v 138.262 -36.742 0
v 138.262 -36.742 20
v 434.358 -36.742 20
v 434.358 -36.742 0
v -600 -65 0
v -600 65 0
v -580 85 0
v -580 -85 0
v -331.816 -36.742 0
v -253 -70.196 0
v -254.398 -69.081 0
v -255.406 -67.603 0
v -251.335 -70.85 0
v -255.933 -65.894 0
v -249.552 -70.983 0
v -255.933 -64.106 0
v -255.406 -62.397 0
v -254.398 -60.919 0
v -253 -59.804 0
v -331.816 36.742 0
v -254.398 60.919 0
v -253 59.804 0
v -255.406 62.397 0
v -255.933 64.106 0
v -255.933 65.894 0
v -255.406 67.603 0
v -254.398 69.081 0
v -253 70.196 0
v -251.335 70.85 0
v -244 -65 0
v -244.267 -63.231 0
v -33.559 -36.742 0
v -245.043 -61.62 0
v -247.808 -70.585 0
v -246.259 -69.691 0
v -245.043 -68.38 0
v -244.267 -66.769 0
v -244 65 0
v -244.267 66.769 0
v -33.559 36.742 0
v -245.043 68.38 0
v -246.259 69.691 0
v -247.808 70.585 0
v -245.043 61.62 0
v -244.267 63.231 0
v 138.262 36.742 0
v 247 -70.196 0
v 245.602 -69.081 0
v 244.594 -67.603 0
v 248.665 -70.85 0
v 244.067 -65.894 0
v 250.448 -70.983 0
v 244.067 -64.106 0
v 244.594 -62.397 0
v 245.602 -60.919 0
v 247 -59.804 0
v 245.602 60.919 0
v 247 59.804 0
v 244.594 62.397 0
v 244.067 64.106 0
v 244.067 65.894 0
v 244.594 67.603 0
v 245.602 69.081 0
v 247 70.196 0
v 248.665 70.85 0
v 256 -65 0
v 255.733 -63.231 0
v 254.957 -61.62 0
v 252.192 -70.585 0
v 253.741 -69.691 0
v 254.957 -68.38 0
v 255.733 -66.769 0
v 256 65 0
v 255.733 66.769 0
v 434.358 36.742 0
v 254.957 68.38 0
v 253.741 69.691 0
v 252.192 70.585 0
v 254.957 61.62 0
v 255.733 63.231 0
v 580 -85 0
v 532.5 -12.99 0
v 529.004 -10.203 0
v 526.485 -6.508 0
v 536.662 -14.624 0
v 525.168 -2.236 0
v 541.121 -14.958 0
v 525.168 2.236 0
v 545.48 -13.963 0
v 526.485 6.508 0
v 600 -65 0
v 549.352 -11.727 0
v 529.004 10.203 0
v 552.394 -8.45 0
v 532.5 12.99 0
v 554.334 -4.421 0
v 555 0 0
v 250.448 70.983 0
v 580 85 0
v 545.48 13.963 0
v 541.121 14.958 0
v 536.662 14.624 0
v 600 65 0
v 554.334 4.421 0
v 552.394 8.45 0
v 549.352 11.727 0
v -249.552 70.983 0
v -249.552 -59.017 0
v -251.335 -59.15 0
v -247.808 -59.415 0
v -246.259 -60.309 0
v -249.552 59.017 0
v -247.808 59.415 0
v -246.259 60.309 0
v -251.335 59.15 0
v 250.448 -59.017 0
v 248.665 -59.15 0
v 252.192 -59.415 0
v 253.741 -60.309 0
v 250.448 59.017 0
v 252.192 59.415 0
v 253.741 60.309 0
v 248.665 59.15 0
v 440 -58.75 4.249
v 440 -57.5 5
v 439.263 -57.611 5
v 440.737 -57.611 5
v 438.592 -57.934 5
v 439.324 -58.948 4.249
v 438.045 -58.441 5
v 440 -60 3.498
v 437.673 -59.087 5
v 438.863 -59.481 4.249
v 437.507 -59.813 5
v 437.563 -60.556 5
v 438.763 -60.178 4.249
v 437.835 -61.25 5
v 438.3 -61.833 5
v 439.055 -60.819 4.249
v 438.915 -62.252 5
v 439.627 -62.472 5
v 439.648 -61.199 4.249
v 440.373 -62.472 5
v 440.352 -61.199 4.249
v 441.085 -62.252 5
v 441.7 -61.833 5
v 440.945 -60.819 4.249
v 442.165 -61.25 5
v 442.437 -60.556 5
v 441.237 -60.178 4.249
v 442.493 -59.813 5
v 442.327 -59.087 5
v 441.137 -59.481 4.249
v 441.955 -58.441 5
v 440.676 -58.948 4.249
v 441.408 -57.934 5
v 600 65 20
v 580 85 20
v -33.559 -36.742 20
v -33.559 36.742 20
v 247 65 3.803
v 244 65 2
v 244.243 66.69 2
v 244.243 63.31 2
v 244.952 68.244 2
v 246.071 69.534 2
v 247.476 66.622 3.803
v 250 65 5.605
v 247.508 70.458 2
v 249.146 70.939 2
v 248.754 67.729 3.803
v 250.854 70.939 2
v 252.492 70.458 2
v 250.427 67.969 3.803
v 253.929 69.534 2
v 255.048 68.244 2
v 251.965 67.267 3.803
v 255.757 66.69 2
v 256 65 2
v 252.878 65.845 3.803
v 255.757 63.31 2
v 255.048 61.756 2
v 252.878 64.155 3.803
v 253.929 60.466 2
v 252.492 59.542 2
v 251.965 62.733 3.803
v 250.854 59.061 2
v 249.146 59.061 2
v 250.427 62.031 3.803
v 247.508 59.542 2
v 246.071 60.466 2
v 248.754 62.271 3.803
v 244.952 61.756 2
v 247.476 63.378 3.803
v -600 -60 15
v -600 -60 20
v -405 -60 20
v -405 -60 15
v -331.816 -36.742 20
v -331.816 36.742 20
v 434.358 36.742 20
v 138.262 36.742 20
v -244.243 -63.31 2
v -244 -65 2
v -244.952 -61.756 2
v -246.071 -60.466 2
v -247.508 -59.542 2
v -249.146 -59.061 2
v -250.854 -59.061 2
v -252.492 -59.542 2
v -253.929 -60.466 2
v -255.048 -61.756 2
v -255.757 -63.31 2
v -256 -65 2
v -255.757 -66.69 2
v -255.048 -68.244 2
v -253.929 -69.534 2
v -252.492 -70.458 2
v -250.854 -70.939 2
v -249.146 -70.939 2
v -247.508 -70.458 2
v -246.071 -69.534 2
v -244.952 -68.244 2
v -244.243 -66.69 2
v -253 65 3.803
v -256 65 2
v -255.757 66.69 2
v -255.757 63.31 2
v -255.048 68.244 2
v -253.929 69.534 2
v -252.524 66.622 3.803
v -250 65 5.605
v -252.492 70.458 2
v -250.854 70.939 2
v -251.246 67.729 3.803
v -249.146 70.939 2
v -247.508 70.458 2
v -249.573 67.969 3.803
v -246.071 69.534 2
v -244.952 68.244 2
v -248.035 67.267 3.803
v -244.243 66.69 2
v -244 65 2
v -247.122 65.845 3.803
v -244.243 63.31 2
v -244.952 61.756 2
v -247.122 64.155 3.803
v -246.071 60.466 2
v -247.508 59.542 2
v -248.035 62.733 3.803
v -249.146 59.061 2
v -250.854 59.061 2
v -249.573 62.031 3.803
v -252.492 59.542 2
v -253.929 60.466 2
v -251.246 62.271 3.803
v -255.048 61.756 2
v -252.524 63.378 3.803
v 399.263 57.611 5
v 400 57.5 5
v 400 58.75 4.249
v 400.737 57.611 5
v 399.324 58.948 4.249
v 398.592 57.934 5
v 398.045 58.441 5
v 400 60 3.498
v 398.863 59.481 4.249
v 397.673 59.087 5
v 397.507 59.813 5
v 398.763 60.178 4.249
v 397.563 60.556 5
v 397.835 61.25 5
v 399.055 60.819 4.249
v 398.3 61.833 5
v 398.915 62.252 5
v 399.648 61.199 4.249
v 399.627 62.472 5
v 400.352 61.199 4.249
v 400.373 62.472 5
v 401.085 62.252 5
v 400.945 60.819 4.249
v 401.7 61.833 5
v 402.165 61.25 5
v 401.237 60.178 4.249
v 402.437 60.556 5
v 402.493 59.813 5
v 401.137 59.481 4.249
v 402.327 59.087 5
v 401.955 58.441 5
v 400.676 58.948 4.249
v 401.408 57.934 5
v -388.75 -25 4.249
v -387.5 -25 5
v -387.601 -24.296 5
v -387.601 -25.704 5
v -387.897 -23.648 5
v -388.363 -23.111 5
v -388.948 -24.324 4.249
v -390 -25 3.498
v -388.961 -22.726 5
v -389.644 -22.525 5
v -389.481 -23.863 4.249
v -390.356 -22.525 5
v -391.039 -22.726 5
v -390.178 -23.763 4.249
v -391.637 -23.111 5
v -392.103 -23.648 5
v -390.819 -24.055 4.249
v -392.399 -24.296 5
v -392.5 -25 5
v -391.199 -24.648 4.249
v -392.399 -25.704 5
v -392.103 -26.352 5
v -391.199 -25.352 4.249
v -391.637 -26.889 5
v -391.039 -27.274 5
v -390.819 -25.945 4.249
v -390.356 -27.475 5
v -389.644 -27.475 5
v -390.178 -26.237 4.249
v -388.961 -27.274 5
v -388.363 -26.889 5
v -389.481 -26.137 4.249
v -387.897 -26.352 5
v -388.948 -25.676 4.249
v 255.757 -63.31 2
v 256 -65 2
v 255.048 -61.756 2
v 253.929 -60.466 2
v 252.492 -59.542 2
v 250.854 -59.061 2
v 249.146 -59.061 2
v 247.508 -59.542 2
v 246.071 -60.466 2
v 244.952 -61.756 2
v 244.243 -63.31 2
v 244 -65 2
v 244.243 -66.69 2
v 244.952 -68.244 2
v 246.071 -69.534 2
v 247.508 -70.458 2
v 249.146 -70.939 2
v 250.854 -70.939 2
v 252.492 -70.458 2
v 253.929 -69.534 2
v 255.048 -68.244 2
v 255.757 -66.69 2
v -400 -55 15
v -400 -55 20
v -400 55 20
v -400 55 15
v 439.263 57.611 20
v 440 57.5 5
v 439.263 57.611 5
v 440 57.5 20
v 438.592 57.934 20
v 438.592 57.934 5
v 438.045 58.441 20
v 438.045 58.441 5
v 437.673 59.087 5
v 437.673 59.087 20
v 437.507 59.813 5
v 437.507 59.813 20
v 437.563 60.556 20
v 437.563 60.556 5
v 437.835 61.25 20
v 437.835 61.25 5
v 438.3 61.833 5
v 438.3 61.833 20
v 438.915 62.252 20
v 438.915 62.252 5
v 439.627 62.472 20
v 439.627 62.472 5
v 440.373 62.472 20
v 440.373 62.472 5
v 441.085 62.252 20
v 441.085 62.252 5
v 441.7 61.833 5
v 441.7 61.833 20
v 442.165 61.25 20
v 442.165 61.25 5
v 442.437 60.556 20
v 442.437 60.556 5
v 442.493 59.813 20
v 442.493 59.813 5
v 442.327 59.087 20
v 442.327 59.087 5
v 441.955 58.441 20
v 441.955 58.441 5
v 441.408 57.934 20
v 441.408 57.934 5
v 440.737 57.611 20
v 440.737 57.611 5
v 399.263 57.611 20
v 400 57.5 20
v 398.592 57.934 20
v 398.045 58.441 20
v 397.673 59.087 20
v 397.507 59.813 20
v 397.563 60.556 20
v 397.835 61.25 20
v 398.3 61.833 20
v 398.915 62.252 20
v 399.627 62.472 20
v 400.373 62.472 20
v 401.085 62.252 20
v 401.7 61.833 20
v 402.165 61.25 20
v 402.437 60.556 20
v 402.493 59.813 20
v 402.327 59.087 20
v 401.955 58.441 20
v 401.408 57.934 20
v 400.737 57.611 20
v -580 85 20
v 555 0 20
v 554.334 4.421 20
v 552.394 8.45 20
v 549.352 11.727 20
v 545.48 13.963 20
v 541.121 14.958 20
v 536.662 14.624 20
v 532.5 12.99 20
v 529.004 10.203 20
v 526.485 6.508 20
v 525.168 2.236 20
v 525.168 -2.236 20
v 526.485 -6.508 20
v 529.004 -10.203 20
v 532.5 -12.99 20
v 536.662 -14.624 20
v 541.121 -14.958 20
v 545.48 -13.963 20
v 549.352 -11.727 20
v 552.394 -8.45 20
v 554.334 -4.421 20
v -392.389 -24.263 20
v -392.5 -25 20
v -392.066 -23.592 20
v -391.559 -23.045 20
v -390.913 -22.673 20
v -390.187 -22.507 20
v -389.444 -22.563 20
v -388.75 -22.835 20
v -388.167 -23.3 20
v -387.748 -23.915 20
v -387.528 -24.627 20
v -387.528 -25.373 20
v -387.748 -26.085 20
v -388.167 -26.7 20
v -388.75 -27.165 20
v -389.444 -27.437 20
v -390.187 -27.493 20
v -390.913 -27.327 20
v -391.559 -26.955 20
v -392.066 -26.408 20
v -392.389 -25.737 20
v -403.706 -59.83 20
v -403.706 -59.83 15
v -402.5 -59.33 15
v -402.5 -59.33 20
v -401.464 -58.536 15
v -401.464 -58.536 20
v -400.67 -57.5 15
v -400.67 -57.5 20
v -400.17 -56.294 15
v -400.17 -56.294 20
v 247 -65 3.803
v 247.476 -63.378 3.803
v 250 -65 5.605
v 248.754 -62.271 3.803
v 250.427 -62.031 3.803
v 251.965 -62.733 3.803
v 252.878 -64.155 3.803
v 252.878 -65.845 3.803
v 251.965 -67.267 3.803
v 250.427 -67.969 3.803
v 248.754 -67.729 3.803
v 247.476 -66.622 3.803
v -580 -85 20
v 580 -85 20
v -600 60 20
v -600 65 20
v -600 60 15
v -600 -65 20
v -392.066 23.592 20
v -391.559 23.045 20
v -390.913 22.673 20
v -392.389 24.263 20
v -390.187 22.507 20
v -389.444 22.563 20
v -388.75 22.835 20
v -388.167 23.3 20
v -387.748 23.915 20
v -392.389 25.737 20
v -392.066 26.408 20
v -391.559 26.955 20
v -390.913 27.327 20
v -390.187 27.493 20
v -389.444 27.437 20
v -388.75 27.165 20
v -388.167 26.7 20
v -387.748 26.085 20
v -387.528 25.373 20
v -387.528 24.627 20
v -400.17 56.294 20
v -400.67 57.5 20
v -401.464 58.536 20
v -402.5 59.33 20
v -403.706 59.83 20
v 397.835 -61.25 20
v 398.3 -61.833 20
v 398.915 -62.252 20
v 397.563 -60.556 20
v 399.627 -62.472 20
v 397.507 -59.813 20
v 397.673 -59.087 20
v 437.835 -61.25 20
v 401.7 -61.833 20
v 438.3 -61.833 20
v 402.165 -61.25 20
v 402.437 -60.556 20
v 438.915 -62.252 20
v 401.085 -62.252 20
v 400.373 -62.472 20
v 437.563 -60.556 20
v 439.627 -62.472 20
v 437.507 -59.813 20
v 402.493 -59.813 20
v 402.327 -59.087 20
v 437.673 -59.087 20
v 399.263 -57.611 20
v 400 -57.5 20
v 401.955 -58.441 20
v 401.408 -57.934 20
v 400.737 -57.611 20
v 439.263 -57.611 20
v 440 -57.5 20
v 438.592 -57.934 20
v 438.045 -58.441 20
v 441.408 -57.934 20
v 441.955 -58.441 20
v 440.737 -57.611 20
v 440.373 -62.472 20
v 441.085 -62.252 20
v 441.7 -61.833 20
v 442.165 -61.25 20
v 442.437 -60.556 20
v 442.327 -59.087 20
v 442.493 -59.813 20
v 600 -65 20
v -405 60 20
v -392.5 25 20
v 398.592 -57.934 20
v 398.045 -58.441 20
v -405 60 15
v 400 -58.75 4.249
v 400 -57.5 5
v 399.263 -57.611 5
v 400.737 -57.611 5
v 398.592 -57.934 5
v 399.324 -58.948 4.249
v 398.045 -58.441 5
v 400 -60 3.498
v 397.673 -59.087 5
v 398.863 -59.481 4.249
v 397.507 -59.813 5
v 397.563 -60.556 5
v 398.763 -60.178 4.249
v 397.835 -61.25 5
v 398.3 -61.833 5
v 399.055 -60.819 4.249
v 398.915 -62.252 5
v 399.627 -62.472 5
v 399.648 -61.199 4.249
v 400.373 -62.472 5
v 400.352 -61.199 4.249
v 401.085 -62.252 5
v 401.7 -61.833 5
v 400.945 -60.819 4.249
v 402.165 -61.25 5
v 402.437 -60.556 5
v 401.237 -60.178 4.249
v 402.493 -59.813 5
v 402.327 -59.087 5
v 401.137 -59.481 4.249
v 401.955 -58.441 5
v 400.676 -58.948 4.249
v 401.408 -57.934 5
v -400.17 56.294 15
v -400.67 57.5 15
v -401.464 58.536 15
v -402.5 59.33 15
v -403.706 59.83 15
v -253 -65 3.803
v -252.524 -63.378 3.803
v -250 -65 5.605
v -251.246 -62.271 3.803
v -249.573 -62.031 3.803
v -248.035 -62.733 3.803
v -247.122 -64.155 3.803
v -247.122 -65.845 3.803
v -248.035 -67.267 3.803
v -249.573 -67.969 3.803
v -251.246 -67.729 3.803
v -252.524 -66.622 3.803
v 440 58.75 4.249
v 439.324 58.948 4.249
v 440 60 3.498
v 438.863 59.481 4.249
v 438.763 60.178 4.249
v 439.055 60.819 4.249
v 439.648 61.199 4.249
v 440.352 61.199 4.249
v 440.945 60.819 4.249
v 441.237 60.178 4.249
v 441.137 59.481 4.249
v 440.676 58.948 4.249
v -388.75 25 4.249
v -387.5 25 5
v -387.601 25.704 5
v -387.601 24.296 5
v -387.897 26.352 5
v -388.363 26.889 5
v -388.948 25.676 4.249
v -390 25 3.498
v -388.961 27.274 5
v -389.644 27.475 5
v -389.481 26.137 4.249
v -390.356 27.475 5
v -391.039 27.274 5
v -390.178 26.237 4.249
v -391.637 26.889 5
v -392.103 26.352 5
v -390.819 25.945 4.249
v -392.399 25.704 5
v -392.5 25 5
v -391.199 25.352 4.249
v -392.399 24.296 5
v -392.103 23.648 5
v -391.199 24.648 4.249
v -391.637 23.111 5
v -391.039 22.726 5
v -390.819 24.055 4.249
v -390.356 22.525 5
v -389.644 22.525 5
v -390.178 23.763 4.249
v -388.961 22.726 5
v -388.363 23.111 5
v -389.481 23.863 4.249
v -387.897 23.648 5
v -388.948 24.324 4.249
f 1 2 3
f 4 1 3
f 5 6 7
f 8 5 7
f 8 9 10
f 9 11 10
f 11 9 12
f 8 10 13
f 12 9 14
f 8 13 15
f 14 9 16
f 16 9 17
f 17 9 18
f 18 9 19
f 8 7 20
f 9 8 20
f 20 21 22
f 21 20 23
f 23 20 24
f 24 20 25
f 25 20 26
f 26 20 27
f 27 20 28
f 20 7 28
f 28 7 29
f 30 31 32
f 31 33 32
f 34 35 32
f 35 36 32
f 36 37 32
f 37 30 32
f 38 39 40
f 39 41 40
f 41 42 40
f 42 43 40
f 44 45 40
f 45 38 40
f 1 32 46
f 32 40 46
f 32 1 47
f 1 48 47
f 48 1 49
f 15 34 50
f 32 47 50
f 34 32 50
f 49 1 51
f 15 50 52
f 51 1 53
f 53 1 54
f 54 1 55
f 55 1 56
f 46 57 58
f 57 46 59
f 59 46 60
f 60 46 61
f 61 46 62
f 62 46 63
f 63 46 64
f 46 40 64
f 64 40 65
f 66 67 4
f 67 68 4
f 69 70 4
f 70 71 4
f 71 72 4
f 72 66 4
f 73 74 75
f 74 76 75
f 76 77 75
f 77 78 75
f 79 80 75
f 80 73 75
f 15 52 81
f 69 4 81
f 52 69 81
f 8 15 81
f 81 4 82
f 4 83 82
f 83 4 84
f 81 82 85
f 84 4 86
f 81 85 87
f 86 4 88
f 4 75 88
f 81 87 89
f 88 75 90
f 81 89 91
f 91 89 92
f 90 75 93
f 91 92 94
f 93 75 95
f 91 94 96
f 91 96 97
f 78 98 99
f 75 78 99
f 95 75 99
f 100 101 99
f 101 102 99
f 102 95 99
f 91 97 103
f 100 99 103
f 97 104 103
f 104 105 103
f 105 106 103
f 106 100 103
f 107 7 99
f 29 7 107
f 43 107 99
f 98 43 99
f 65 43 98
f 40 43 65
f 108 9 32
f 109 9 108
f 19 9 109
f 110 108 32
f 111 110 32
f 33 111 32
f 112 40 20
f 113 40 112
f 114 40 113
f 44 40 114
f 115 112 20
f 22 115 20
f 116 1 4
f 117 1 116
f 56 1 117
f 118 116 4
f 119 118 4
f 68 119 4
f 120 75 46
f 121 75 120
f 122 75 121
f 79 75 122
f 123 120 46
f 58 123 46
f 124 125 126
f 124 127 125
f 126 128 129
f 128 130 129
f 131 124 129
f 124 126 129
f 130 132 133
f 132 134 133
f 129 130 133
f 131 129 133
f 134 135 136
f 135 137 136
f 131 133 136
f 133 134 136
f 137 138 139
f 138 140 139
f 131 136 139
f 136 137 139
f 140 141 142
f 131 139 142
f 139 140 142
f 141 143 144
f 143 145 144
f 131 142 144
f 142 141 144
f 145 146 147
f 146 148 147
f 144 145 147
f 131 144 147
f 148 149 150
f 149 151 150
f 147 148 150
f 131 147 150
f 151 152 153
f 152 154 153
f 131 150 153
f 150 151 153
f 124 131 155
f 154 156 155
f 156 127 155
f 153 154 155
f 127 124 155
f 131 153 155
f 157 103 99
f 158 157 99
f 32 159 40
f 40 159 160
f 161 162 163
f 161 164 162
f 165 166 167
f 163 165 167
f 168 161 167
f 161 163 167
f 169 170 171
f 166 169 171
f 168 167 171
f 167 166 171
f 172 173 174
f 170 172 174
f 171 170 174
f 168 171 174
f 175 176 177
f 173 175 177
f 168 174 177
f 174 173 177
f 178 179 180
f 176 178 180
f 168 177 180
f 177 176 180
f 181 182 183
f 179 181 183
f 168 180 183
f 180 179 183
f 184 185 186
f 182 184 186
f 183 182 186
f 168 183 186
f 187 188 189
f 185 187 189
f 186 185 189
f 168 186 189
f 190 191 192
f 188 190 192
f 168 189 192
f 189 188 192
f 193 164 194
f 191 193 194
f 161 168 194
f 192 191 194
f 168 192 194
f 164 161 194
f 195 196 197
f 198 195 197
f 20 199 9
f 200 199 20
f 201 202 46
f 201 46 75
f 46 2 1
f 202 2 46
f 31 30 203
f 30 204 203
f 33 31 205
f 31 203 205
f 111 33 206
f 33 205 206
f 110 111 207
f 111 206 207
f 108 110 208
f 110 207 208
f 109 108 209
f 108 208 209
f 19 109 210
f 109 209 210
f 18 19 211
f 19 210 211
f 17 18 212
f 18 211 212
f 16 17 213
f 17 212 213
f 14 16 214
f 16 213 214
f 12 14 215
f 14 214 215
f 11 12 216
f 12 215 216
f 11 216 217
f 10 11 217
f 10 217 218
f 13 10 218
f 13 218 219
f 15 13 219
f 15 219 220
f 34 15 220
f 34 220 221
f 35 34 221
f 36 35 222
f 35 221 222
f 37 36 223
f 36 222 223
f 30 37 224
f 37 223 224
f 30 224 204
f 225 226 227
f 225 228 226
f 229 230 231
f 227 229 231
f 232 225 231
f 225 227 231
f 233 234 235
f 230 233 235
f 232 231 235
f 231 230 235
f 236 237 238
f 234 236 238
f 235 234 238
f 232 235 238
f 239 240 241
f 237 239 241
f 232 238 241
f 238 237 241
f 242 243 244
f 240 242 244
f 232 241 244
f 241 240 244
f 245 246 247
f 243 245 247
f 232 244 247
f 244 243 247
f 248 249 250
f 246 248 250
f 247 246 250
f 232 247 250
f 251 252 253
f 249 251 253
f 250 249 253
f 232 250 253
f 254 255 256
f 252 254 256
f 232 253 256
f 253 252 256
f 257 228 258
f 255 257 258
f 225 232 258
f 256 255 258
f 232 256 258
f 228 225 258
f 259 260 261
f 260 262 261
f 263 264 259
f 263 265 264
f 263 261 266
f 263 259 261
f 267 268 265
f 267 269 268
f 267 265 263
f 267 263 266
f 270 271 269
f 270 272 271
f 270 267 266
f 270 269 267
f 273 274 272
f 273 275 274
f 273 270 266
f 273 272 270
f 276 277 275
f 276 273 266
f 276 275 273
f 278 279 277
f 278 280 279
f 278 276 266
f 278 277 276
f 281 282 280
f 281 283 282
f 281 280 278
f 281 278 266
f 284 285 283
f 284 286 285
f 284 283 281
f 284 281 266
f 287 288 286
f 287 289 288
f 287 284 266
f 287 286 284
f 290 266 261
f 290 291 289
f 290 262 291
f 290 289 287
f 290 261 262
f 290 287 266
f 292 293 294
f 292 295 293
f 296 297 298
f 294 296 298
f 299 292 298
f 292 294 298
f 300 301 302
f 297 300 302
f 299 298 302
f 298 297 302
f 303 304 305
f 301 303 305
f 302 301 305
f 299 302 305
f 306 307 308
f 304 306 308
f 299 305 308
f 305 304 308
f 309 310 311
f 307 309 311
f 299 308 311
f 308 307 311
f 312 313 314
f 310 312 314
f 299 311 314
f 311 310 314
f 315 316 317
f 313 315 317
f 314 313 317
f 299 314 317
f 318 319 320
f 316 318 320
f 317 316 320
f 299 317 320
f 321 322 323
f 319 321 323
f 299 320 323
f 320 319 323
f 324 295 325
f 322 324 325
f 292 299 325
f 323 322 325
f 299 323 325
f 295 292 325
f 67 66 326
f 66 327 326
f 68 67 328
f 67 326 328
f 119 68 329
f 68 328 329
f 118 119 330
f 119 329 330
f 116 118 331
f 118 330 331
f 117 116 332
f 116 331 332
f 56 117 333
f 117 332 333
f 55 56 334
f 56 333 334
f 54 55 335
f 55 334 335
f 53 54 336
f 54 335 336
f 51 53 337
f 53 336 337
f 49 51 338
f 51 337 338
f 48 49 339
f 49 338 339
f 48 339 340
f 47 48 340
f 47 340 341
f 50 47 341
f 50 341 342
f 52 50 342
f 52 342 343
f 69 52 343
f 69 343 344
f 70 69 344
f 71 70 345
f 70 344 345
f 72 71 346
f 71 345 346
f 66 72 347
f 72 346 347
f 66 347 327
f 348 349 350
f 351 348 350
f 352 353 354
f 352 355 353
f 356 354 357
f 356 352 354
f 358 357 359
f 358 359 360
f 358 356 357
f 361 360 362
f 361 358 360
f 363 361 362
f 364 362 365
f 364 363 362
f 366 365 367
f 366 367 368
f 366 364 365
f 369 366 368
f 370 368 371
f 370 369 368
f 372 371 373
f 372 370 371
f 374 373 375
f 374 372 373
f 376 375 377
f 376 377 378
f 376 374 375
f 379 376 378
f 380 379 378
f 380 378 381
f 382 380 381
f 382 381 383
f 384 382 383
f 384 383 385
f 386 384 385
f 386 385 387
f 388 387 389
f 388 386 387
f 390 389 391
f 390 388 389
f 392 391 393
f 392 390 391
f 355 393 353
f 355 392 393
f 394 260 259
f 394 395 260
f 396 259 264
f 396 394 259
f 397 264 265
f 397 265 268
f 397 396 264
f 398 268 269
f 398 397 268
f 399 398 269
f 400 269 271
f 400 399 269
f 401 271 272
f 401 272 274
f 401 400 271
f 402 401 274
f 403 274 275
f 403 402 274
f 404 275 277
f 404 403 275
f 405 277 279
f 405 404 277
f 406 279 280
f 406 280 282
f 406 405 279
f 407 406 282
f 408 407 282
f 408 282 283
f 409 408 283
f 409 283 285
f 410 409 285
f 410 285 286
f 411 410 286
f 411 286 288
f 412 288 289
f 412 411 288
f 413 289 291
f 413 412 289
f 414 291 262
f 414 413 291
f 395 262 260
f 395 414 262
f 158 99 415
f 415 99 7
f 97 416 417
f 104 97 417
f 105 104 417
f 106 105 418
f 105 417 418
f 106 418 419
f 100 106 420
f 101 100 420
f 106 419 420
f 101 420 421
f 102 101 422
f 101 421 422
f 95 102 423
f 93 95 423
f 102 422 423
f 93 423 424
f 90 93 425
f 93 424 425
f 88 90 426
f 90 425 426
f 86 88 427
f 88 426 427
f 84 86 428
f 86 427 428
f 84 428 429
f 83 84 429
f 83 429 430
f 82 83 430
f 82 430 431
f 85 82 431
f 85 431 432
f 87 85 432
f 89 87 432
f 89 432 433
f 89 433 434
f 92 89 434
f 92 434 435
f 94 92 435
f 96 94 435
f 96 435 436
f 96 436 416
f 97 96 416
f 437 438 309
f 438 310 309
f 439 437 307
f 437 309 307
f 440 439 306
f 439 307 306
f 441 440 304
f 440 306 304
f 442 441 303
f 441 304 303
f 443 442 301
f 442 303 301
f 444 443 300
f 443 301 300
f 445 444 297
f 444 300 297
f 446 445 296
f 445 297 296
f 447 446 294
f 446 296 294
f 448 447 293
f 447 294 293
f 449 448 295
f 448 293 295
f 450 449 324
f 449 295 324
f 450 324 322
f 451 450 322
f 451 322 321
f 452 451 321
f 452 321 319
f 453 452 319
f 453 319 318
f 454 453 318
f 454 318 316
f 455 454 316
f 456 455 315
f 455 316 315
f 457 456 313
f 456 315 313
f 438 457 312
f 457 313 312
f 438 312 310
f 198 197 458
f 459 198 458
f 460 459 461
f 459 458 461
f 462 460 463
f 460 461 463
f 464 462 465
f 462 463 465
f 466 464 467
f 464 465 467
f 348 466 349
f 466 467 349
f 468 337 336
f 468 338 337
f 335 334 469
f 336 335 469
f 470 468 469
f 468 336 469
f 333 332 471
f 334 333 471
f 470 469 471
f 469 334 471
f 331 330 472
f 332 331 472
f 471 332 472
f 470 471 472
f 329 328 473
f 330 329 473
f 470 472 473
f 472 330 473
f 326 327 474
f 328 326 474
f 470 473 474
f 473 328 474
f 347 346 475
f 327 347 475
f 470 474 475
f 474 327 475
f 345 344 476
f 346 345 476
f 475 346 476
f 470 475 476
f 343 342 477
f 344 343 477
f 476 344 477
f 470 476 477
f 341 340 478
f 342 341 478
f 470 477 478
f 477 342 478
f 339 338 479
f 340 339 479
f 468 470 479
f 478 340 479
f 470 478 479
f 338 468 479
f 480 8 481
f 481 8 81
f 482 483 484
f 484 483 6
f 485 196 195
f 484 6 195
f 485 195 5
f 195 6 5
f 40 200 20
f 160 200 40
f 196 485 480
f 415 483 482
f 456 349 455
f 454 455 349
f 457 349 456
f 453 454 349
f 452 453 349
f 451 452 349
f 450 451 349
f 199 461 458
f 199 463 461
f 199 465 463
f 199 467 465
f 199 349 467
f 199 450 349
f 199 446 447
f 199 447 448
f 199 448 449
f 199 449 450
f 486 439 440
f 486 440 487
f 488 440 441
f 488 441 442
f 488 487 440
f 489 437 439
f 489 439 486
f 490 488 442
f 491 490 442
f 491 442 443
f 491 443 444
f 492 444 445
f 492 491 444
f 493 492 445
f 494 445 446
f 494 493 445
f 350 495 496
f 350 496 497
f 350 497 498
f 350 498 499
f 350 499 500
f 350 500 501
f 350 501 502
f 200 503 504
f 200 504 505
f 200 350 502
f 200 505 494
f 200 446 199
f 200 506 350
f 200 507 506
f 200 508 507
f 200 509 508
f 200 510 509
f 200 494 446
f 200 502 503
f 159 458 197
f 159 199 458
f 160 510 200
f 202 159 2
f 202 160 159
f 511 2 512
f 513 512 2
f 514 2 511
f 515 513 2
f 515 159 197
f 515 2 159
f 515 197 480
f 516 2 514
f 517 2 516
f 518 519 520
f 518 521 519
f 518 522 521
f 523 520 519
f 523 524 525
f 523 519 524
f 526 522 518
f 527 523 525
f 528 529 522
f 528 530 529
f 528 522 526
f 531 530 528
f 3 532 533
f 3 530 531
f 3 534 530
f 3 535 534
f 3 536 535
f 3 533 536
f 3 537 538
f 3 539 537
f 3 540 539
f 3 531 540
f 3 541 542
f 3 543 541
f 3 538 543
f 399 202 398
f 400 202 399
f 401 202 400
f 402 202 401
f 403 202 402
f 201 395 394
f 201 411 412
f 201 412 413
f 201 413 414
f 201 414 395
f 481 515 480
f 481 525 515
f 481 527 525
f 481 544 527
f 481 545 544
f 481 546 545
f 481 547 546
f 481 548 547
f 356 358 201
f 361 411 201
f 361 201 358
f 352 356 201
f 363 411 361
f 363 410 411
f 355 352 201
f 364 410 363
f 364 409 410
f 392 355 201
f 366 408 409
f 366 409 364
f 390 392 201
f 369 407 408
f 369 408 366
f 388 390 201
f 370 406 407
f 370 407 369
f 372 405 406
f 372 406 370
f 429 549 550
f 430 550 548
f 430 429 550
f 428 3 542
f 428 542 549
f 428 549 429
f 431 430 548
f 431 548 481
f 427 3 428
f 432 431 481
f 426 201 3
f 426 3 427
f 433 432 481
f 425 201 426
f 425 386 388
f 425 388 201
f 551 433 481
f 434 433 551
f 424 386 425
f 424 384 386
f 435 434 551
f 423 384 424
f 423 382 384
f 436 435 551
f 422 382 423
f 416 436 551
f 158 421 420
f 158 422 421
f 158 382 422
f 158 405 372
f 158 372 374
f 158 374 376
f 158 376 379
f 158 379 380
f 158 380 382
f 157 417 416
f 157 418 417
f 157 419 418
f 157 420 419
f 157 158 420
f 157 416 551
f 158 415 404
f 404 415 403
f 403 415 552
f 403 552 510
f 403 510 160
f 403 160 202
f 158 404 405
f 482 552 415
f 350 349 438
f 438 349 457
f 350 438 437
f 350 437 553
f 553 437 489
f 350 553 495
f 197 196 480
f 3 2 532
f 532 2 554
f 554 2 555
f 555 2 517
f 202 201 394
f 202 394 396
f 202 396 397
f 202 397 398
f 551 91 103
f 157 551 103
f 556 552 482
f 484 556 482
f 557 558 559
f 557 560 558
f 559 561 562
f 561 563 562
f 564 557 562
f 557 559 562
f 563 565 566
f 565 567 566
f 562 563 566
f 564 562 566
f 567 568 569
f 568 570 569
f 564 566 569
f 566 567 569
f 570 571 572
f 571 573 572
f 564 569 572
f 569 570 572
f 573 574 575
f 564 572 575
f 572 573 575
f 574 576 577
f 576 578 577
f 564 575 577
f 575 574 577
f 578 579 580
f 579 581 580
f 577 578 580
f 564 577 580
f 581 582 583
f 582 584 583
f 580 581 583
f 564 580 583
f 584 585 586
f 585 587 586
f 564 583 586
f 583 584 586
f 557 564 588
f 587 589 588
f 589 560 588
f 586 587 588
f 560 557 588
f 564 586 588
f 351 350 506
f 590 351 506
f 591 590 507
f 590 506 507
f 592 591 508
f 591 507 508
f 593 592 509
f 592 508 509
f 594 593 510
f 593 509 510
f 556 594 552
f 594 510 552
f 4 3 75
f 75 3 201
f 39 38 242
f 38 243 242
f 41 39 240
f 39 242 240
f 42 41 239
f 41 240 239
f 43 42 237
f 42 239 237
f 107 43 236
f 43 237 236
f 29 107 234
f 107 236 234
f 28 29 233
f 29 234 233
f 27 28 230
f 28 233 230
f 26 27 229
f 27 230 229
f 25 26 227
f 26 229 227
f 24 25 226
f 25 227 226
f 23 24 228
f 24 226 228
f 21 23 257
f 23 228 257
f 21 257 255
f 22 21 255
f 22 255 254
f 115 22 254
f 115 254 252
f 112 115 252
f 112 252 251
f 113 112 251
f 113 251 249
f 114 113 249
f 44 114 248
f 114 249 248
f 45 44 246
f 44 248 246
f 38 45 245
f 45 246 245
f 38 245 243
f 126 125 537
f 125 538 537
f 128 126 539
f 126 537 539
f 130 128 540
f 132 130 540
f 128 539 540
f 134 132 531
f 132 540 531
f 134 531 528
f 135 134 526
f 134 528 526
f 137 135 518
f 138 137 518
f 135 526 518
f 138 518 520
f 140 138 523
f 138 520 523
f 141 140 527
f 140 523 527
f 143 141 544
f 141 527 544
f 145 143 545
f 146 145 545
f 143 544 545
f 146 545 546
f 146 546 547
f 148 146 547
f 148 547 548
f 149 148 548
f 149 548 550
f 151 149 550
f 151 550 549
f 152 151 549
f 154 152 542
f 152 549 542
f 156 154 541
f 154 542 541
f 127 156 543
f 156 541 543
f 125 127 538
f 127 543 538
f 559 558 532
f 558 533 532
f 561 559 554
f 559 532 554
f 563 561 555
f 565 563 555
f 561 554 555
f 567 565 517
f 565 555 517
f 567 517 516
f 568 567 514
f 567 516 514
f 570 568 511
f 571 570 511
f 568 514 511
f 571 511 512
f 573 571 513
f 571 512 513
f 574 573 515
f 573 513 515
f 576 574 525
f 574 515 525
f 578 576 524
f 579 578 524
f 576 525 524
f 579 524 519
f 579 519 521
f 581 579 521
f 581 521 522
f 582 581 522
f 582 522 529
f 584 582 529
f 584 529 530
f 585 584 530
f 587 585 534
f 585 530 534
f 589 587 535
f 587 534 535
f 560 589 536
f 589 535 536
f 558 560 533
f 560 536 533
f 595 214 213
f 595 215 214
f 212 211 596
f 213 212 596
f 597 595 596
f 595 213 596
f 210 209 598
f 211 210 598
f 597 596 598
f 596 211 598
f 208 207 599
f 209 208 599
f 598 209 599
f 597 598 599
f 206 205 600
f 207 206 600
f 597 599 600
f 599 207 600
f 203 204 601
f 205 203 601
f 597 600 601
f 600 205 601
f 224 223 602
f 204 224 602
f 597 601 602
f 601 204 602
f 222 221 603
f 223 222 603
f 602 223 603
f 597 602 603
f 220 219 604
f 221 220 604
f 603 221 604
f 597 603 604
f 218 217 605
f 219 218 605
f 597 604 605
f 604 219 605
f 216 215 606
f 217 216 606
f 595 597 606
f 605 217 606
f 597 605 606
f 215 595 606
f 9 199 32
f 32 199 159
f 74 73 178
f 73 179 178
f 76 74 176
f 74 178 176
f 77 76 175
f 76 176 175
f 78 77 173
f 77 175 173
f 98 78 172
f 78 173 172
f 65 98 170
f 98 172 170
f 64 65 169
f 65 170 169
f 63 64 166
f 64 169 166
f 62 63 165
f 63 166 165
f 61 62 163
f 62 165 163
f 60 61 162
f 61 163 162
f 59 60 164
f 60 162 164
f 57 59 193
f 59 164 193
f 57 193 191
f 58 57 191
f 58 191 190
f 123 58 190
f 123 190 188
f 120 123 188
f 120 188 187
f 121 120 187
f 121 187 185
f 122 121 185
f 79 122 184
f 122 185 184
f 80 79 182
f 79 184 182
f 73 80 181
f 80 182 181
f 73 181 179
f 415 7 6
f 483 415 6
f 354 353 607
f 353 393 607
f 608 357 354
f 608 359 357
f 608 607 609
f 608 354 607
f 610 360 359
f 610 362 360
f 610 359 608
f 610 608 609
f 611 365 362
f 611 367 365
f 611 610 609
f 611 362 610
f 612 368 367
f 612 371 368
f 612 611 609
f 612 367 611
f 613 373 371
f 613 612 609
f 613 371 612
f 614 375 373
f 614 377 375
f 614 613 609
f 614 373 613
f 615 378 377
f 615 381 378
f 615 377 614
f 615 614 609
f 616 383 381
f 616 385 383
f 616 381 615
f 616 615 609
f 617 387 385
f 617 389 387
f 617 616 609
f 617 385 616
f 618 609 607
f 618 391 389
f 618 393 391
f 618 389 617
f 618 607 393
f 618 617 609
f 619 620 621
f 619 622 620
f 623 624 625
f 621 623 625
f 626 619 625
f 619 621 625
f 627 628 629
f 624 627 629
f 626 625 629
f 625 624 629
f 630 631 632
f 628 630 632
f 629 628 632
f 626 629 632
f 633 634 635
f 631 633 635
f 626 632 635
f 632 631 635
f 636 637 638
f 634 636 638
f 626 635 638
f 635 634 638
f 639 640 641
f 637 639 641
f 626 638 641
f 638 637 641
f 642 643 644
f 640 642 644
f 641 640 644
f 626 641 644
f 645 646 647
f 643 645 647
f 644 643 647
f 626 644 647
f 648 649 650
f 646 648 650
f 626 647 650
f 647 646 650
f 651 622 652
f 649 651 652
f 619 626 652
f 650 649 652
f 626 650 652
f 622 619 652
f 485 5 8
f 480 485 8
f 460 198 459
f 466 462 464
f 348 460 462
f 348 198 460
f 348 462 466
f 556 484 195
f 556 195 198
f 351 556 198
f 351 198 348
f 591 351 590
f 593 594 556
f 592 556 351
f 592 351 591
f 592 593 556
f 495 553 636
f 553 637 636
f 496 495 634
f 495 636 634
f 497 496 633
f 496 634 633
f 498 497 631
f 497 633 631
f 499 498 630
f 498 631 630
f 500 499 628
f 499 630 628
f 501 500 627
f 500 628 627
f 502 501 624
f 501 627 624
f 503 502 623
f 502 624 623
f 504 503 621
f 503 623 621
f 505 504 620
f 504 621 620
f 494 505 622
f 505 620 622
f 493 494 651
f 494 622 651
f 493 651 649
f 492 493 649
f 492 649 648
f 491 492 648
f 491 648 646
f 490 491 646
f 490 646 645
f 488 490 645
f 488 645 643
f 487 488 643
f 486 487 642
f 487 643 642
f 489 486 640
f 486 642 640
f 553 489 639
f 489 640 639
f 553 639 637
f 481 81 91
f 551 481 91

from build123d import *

# Parameters (mm, degrees)
EXTRUDE_1_DEPTH             = 20
SKETCH_2_R                  = 15
CUT_EXTRUDE_1_DEPTH         = 21
CUT_EXTRUDE_2_DEPTH         = 5
HOLE_WIZARD_M6_1_D          = 5
HOLE_WIZARD_M6_1_DEPTH      = 15
HOLE_WIZARD_M6_1_TIP        = 1.502151548
HOLE_WIZARD_M6_2_AT_2_COUNT = 2
HOLE_WIZARD_M6_2_AT_2_PITCH = 40
MM_1_D                      = 12
MM_1_DEPTH                  = 2
MM_1_TIP                    = 3.605163714
SKETCH_19_W                 = 298.256507651
SKETCH_19_H                 = 73.483487392
SKETCH_19_W_2               = 296.09522861
CUT_EXTRUDE_3_DEPTH         = 21


with BuildPart() as part:
    # 草图1 → 凸台-拉伸1 (new body)
    with BuildSketch(Plane.XY):
        Polygon((-580, 85), (-600, 65), (-600, -65), (-580, -85), (580, -85), (600, -65), (600, 65), (580, 85), align=None)
    extrude(amount=EXTRUDE_1_DEPTH)

    # 草图2 → 切除-拉伸1 (cut, through all)
    with BuildSketch(Plane.XY.offset(20)):
        with Locations((540, 0)):
            Circle(SKETCH_2_R)
    extrude(amount=-CUT_EXTRUDE_1_DEPTH, mode=Mode.SUBTRACT)

    # 草图3 → 切除-拉伸2 (cut)
    with BuildSketch(Plane.XY.offset(20)):
        with BuildLine():
            Line((-800, -60), (-405, -60))
            ThreePointArc((-405, -60), (-401.464466094, -58.535533906), (-400, -55))
            Line((-400, -55), (-400, 55))
            ThreePointArc((-400, 55), (-401.464466094, 58.535533906), (-405, 60))
            Line((-405, 60), (-800, 60))
            Line((-800, 60), (-800, -60))
        make_face()
    extrude(amount=-CUT_EXTRUDE_2_DEPTH, mode=Mode.SUBTRACT)

    # M6 螺纹孔1
    with Locations(Plane(origin=(-390, 25, 20), x_dir=(1, 0, 0), z_dir=(0, 0, 1))):
        with Locations((0, 0), (0, -50)):
            Hole(HOLE_WIZARD_M6_1_D / 2, depth=HOLE_WIZARD_M6_1_DEPTH)
            with Locations((0, 0, -(HOLE_WIZARD_M6_1_DEPTH + HOLE_WIZARD_M6_1_TIP / 2))):  # 118° drill point
                Cone(0, HOLE_WIZARD_M6_1_D / 2, HOLE_WIZARD_M6_1_TIP, mode=Mode.SUBTRACT)

    # 草图16 → M6 螺纹孔2 (revolve, cut)
    with BuildSketch(Plane(origin=(400, 60, 20), x_dir=(0, -1, 0), z_dir=(1, 0, 0))):
        Polygon((0, 0), (0, 16.502151548), (2.5, 15), (2.5, 0), align=None)
    hole_wizard_m6_2 = revolve(axis=Axis((400, 60, 26.35), (0, 0, -1)), mode=Mode.SUBTRACT)

    # M6 螺纹孔2 at 2: M6 螺纹孔2 ×2
    with Locations(*[(i * HOLE_WIZARD_M6_2_AT_2_PITCH, 0, 0) for i in range(1, HOLE_WIZARD_M6_2_AT_2_COUNT)]):
        add(hole_wizard_m6_2, mode=Mode.SUBTRACT)

    # 镜向2: M6 螺纹孔2 across plane
    add(hole_wizard_m6_2.mirror(Plane.ZX), mode=Mode.SUBTRACT)

    # 镜向2 copy 1 sketch → 镜向2 copy 1 (revolve, cut)
    with BuildSketch(Plane(origin=(440, -60, 20), x_dir=(0, 1, 0), z_dir=(1, 0, 0))):
        Polygon((0, 0), (0, -16.502151548), (2.5, -15), (2.5, 0), align=None)
    revolve(axis=Axis((440, -60, 26.35), (0, 0, 1)), mode=Mode.SUBTRACT)

    # 大小mm 暗销孔1
    with Locations(Plane(origin=(0, 0, 0), x_dir=(-1, 0, 0), z_dir=(0, 0, -1))):
        with Locations((-250, 65), (250, 65), (250, -65), (-250, -65)):
            Hole(MM_1_D / 2, depth=MM_1_DEPTH)
            with Locations((0, 0, -(MM_1_DEPTH + MM_1_TIP / 2))):  # 118° drill point
                Cone(0, MM_1_D / 2, MM_1_TIP, mode=Mode.SUBTRACT)

    # 草图19 → 切除-拉伸3 (cut, through all)
    with BuildSketch(Plane.XY.offset(20)):
        with Locations((-182.687664533, 0)):
            Rectangle(SKETCH_19_W, SKETCH_19_H)
        with Locations((286.309887354, 0)):
            Rectangle(SKETCH_19_W_2, SKETCH_19_H)
    extrude(amount=-CUT_EXTRUDE_3_DEPTH, mode=Mode.SUBTRACT)


solid = part.part
